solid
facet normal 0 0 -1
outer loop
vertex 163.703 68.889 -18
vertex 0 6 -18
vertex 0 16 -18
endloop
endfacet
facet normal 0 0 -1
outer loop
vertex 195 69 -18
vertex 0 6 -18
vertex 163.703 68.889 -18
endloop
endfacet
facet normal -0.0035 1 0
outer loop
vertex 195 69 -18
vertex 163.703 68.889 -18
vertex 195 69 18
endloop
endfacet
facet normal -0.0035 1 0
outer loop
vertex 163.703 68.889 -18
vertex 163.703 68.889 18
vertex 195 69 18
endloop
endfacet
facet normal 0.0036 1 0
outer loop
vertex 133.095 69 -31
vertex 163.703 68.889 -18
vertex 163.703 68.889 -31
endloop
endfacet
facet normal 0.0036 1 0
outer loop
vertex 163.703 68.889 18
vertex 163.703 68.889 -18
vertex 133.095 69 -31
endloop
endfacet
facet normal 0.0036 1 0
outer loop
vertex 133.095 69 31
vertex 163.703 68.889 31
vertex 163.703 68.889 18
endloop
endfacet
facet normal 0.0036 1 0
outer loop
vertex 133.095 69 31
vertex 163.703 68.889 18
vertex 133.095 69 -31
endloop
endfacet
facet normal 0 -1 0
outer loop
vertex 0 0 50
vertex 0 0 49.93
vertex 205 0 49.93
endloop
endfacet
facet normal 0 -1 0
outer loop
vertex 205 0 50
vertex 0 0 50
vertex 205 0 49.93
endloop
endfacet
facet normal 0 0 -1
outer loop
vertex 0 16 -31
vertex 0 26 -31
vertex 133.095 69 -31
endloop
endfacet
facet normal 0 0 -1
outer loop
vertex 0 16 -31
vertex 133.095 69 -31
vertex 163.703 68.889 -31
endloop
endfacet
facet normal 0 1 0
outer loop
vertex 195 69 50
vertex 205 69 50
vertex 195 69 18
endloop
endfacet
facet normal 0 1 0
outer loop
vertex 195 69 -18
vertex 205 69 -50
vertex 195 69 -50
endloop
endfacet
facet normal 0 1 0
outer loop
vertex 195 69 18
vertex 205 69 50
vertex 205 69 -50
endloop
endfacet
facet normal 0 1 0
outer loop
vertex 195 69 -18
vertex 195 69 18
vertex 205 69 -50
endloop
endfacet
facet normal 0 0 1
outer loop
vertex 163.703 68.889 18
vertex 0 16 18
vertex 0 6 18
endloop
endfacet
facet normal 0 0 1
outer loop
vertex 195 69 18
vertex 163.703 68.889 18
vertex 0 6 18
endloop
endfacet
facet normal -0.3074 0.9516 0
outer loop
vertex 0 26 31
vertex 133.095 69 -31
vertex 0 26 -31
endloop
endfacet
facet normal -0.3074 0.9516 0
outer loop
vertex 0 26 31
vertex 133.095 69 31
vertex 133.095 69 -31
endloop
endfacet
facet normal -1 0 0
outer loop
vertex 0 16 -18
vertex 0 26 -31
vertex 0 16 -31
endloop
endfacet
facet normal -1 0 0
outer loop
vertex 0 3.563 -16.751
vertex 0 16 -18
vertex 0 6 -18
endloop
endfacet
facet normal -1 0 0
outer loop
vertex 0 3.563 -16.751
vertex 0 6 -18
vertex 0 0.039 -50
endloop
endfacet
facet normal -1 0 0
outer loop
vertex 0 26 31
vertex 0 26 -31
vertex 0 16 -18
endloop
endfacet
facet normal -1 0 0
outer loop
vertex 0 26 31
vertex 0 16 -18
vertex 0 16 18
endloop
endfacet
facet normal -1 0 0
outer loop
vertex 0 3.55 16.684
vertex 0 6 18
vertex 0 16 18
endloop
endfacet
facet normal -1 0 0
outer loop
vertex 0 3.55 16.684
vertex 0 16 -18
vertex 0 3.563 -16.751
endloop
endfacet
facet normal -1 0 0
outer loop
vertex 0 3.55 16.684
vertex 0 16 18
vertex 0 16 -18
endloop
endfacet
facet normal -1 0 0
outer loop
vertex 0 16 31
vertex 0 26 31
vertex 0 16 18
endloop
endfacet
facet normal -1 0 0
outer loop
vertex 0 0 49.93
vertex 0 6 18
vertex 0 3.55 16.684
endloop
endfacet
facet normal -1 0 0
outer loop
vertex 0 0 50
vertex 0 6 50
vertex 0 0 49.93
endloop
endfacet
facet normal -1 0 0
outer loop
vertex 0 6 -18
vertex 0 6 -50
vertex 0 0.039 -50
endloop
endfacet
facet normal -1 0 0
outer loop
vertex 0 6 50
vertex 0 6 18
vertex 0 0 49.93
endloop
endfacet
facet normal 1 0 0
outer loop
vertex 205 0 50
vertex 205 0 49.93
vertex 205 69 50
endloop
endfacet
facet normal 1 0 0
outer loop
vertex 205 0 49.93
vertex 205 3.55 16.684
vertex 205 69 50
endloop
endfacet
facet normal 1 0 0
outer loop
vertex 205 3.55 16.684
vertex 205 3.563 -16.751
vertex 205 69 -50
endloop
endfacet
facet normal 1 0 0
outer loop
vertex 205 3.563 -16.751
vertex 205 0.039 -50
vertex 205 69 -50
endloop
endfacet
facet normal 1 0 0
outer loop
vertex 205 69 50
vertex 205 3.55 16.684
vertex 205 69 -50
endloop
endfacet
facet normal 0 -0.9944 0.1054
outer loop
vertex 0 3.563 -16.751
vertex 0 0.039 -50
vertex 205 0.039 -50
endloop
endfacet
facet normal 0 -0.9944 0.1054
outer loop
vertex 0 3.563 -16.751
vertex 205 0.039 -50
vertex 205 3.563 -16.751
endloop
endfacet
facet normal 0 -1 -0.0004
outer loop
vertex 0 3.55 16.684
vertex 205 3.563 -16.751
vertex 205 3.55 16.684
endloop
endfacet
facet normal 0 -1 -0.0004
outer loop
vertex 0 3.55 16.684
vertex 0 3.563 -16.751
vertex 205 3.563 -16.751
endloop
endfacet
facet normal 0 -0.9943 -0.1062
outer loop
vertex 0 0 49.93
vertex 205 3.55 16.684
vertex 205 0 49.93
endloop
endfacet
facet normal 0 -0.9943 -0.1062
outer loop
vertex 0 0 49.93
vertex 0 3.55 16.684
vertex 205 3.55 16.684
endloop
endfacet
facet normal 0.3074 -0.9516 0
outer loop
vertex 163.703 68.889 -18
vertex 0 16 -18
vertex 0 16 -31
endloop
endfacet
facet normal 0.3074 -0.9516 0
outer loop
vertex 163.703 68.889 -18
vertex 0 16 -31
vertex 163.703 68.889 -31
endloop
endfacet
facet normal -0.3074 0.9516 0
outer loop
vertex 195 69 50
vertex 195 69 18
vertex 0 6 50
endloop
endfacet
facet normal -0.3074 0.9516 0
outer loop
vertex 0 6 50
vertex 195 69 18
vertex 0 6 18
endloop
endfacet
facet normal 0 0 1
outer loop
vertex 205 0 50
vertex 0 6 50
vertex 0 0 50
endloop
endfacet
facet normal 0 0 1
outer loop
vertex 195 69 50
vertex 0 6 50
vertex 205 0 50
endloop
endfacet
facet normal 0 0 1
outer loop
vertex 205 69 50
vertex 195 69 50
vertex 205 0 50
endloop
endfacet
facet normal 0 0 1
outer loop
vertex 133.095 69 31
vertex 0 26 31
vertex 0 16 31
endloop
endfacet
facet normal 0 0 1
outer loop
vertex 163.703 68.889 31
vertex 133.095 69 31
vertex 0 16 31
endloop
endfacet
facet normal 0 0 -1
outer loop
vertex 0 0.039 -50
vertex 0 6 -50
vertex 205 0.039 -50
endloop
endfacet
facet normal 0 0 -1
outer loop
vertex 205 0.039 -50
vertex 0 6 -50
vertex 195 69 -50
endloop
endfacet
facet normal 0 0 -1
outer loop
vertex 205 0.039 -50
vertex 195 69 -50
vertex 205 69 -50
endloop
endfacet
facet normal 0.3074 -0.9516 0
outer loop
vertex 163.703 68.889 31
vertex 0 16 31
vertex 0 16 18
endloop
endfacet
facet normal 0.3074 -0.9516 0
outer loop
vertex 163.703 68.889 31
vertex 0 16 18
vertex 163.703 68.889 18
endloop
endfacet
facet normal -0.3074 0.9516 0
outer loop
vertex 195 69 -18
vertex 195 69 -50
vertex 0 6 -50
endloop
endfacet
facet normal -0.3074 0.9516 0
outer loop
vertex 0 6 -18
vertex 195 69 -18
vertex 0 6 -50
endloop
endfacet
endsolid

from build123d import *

# Parameters (mm, degrees)
F1_DEPTH = 50
F2_DEPTH = 50
F3_DEPTH = 18
F4_DEPTH = 18
F5_DEPTH = 31
F7_DEPTH = 205.001


with BuildPart() as f1:
    # F0 (on Top) → F1 (new body)
    with BuildSketch(Plane.XY):
        Polygon((0, 6), (0, 0), (205, 0), (205, 69), (195, 69), align=None)
    extrude(amount=-F1_DEPTH)

    # F0 (on Top) → F2 (join)
    with BuildSketch(Plane.XY):
        Polygon((0, 6), (0, 0), (205, 0), (205, 69), (195, 69), align=None)
    extrude(amount=F2_DEPTH)

    # F0 (on Top) → F3 (join)
    with BuildSketch(Plane.XY):
        Polygon((0, 16), (0, 6), (195, 69), (163.703159, 68.888713), align=None)
    extrude(amount=F3_DEPTH)

    # F3_face (on face) → F4 (join)
    with BuildSketch(Plane(origin=(89.903344, 39.900279, 0), x_dir=(1, 0, 0), z_dir=(0, 0, -1))):
        Polygon((105.096656, -29.099721), (-89.903344, 33.900279), (-89.903344, 23.900279), (73.799815, -28.988434), align=None)
    extrude(amount=F4_DEPTH)

    # F0 (on Top) → F5 (join, symmetric)
    with BuildSketch(Plane.XY):
        Polygon((0, 26), (0, 16), (163.703159, 68.888713), (133.095238, 69), align=None)
    extrude(amount=F5_DEPTH, both=True)

    # F6 (on Right) → F7 (cut, through all)
    with BuildSketch(Plane.YZ):
        with BuildLine():
            Line((0, 49.929991), (0, -50.243031))
            ThreePointArc((0, -50.243031), (4.000039, -0.15652), (0, 49.929991))
        make_face()
    extrude(amount=F7_DEPTH, mode=Mode.SUBTRACT)


solid = f1.part
